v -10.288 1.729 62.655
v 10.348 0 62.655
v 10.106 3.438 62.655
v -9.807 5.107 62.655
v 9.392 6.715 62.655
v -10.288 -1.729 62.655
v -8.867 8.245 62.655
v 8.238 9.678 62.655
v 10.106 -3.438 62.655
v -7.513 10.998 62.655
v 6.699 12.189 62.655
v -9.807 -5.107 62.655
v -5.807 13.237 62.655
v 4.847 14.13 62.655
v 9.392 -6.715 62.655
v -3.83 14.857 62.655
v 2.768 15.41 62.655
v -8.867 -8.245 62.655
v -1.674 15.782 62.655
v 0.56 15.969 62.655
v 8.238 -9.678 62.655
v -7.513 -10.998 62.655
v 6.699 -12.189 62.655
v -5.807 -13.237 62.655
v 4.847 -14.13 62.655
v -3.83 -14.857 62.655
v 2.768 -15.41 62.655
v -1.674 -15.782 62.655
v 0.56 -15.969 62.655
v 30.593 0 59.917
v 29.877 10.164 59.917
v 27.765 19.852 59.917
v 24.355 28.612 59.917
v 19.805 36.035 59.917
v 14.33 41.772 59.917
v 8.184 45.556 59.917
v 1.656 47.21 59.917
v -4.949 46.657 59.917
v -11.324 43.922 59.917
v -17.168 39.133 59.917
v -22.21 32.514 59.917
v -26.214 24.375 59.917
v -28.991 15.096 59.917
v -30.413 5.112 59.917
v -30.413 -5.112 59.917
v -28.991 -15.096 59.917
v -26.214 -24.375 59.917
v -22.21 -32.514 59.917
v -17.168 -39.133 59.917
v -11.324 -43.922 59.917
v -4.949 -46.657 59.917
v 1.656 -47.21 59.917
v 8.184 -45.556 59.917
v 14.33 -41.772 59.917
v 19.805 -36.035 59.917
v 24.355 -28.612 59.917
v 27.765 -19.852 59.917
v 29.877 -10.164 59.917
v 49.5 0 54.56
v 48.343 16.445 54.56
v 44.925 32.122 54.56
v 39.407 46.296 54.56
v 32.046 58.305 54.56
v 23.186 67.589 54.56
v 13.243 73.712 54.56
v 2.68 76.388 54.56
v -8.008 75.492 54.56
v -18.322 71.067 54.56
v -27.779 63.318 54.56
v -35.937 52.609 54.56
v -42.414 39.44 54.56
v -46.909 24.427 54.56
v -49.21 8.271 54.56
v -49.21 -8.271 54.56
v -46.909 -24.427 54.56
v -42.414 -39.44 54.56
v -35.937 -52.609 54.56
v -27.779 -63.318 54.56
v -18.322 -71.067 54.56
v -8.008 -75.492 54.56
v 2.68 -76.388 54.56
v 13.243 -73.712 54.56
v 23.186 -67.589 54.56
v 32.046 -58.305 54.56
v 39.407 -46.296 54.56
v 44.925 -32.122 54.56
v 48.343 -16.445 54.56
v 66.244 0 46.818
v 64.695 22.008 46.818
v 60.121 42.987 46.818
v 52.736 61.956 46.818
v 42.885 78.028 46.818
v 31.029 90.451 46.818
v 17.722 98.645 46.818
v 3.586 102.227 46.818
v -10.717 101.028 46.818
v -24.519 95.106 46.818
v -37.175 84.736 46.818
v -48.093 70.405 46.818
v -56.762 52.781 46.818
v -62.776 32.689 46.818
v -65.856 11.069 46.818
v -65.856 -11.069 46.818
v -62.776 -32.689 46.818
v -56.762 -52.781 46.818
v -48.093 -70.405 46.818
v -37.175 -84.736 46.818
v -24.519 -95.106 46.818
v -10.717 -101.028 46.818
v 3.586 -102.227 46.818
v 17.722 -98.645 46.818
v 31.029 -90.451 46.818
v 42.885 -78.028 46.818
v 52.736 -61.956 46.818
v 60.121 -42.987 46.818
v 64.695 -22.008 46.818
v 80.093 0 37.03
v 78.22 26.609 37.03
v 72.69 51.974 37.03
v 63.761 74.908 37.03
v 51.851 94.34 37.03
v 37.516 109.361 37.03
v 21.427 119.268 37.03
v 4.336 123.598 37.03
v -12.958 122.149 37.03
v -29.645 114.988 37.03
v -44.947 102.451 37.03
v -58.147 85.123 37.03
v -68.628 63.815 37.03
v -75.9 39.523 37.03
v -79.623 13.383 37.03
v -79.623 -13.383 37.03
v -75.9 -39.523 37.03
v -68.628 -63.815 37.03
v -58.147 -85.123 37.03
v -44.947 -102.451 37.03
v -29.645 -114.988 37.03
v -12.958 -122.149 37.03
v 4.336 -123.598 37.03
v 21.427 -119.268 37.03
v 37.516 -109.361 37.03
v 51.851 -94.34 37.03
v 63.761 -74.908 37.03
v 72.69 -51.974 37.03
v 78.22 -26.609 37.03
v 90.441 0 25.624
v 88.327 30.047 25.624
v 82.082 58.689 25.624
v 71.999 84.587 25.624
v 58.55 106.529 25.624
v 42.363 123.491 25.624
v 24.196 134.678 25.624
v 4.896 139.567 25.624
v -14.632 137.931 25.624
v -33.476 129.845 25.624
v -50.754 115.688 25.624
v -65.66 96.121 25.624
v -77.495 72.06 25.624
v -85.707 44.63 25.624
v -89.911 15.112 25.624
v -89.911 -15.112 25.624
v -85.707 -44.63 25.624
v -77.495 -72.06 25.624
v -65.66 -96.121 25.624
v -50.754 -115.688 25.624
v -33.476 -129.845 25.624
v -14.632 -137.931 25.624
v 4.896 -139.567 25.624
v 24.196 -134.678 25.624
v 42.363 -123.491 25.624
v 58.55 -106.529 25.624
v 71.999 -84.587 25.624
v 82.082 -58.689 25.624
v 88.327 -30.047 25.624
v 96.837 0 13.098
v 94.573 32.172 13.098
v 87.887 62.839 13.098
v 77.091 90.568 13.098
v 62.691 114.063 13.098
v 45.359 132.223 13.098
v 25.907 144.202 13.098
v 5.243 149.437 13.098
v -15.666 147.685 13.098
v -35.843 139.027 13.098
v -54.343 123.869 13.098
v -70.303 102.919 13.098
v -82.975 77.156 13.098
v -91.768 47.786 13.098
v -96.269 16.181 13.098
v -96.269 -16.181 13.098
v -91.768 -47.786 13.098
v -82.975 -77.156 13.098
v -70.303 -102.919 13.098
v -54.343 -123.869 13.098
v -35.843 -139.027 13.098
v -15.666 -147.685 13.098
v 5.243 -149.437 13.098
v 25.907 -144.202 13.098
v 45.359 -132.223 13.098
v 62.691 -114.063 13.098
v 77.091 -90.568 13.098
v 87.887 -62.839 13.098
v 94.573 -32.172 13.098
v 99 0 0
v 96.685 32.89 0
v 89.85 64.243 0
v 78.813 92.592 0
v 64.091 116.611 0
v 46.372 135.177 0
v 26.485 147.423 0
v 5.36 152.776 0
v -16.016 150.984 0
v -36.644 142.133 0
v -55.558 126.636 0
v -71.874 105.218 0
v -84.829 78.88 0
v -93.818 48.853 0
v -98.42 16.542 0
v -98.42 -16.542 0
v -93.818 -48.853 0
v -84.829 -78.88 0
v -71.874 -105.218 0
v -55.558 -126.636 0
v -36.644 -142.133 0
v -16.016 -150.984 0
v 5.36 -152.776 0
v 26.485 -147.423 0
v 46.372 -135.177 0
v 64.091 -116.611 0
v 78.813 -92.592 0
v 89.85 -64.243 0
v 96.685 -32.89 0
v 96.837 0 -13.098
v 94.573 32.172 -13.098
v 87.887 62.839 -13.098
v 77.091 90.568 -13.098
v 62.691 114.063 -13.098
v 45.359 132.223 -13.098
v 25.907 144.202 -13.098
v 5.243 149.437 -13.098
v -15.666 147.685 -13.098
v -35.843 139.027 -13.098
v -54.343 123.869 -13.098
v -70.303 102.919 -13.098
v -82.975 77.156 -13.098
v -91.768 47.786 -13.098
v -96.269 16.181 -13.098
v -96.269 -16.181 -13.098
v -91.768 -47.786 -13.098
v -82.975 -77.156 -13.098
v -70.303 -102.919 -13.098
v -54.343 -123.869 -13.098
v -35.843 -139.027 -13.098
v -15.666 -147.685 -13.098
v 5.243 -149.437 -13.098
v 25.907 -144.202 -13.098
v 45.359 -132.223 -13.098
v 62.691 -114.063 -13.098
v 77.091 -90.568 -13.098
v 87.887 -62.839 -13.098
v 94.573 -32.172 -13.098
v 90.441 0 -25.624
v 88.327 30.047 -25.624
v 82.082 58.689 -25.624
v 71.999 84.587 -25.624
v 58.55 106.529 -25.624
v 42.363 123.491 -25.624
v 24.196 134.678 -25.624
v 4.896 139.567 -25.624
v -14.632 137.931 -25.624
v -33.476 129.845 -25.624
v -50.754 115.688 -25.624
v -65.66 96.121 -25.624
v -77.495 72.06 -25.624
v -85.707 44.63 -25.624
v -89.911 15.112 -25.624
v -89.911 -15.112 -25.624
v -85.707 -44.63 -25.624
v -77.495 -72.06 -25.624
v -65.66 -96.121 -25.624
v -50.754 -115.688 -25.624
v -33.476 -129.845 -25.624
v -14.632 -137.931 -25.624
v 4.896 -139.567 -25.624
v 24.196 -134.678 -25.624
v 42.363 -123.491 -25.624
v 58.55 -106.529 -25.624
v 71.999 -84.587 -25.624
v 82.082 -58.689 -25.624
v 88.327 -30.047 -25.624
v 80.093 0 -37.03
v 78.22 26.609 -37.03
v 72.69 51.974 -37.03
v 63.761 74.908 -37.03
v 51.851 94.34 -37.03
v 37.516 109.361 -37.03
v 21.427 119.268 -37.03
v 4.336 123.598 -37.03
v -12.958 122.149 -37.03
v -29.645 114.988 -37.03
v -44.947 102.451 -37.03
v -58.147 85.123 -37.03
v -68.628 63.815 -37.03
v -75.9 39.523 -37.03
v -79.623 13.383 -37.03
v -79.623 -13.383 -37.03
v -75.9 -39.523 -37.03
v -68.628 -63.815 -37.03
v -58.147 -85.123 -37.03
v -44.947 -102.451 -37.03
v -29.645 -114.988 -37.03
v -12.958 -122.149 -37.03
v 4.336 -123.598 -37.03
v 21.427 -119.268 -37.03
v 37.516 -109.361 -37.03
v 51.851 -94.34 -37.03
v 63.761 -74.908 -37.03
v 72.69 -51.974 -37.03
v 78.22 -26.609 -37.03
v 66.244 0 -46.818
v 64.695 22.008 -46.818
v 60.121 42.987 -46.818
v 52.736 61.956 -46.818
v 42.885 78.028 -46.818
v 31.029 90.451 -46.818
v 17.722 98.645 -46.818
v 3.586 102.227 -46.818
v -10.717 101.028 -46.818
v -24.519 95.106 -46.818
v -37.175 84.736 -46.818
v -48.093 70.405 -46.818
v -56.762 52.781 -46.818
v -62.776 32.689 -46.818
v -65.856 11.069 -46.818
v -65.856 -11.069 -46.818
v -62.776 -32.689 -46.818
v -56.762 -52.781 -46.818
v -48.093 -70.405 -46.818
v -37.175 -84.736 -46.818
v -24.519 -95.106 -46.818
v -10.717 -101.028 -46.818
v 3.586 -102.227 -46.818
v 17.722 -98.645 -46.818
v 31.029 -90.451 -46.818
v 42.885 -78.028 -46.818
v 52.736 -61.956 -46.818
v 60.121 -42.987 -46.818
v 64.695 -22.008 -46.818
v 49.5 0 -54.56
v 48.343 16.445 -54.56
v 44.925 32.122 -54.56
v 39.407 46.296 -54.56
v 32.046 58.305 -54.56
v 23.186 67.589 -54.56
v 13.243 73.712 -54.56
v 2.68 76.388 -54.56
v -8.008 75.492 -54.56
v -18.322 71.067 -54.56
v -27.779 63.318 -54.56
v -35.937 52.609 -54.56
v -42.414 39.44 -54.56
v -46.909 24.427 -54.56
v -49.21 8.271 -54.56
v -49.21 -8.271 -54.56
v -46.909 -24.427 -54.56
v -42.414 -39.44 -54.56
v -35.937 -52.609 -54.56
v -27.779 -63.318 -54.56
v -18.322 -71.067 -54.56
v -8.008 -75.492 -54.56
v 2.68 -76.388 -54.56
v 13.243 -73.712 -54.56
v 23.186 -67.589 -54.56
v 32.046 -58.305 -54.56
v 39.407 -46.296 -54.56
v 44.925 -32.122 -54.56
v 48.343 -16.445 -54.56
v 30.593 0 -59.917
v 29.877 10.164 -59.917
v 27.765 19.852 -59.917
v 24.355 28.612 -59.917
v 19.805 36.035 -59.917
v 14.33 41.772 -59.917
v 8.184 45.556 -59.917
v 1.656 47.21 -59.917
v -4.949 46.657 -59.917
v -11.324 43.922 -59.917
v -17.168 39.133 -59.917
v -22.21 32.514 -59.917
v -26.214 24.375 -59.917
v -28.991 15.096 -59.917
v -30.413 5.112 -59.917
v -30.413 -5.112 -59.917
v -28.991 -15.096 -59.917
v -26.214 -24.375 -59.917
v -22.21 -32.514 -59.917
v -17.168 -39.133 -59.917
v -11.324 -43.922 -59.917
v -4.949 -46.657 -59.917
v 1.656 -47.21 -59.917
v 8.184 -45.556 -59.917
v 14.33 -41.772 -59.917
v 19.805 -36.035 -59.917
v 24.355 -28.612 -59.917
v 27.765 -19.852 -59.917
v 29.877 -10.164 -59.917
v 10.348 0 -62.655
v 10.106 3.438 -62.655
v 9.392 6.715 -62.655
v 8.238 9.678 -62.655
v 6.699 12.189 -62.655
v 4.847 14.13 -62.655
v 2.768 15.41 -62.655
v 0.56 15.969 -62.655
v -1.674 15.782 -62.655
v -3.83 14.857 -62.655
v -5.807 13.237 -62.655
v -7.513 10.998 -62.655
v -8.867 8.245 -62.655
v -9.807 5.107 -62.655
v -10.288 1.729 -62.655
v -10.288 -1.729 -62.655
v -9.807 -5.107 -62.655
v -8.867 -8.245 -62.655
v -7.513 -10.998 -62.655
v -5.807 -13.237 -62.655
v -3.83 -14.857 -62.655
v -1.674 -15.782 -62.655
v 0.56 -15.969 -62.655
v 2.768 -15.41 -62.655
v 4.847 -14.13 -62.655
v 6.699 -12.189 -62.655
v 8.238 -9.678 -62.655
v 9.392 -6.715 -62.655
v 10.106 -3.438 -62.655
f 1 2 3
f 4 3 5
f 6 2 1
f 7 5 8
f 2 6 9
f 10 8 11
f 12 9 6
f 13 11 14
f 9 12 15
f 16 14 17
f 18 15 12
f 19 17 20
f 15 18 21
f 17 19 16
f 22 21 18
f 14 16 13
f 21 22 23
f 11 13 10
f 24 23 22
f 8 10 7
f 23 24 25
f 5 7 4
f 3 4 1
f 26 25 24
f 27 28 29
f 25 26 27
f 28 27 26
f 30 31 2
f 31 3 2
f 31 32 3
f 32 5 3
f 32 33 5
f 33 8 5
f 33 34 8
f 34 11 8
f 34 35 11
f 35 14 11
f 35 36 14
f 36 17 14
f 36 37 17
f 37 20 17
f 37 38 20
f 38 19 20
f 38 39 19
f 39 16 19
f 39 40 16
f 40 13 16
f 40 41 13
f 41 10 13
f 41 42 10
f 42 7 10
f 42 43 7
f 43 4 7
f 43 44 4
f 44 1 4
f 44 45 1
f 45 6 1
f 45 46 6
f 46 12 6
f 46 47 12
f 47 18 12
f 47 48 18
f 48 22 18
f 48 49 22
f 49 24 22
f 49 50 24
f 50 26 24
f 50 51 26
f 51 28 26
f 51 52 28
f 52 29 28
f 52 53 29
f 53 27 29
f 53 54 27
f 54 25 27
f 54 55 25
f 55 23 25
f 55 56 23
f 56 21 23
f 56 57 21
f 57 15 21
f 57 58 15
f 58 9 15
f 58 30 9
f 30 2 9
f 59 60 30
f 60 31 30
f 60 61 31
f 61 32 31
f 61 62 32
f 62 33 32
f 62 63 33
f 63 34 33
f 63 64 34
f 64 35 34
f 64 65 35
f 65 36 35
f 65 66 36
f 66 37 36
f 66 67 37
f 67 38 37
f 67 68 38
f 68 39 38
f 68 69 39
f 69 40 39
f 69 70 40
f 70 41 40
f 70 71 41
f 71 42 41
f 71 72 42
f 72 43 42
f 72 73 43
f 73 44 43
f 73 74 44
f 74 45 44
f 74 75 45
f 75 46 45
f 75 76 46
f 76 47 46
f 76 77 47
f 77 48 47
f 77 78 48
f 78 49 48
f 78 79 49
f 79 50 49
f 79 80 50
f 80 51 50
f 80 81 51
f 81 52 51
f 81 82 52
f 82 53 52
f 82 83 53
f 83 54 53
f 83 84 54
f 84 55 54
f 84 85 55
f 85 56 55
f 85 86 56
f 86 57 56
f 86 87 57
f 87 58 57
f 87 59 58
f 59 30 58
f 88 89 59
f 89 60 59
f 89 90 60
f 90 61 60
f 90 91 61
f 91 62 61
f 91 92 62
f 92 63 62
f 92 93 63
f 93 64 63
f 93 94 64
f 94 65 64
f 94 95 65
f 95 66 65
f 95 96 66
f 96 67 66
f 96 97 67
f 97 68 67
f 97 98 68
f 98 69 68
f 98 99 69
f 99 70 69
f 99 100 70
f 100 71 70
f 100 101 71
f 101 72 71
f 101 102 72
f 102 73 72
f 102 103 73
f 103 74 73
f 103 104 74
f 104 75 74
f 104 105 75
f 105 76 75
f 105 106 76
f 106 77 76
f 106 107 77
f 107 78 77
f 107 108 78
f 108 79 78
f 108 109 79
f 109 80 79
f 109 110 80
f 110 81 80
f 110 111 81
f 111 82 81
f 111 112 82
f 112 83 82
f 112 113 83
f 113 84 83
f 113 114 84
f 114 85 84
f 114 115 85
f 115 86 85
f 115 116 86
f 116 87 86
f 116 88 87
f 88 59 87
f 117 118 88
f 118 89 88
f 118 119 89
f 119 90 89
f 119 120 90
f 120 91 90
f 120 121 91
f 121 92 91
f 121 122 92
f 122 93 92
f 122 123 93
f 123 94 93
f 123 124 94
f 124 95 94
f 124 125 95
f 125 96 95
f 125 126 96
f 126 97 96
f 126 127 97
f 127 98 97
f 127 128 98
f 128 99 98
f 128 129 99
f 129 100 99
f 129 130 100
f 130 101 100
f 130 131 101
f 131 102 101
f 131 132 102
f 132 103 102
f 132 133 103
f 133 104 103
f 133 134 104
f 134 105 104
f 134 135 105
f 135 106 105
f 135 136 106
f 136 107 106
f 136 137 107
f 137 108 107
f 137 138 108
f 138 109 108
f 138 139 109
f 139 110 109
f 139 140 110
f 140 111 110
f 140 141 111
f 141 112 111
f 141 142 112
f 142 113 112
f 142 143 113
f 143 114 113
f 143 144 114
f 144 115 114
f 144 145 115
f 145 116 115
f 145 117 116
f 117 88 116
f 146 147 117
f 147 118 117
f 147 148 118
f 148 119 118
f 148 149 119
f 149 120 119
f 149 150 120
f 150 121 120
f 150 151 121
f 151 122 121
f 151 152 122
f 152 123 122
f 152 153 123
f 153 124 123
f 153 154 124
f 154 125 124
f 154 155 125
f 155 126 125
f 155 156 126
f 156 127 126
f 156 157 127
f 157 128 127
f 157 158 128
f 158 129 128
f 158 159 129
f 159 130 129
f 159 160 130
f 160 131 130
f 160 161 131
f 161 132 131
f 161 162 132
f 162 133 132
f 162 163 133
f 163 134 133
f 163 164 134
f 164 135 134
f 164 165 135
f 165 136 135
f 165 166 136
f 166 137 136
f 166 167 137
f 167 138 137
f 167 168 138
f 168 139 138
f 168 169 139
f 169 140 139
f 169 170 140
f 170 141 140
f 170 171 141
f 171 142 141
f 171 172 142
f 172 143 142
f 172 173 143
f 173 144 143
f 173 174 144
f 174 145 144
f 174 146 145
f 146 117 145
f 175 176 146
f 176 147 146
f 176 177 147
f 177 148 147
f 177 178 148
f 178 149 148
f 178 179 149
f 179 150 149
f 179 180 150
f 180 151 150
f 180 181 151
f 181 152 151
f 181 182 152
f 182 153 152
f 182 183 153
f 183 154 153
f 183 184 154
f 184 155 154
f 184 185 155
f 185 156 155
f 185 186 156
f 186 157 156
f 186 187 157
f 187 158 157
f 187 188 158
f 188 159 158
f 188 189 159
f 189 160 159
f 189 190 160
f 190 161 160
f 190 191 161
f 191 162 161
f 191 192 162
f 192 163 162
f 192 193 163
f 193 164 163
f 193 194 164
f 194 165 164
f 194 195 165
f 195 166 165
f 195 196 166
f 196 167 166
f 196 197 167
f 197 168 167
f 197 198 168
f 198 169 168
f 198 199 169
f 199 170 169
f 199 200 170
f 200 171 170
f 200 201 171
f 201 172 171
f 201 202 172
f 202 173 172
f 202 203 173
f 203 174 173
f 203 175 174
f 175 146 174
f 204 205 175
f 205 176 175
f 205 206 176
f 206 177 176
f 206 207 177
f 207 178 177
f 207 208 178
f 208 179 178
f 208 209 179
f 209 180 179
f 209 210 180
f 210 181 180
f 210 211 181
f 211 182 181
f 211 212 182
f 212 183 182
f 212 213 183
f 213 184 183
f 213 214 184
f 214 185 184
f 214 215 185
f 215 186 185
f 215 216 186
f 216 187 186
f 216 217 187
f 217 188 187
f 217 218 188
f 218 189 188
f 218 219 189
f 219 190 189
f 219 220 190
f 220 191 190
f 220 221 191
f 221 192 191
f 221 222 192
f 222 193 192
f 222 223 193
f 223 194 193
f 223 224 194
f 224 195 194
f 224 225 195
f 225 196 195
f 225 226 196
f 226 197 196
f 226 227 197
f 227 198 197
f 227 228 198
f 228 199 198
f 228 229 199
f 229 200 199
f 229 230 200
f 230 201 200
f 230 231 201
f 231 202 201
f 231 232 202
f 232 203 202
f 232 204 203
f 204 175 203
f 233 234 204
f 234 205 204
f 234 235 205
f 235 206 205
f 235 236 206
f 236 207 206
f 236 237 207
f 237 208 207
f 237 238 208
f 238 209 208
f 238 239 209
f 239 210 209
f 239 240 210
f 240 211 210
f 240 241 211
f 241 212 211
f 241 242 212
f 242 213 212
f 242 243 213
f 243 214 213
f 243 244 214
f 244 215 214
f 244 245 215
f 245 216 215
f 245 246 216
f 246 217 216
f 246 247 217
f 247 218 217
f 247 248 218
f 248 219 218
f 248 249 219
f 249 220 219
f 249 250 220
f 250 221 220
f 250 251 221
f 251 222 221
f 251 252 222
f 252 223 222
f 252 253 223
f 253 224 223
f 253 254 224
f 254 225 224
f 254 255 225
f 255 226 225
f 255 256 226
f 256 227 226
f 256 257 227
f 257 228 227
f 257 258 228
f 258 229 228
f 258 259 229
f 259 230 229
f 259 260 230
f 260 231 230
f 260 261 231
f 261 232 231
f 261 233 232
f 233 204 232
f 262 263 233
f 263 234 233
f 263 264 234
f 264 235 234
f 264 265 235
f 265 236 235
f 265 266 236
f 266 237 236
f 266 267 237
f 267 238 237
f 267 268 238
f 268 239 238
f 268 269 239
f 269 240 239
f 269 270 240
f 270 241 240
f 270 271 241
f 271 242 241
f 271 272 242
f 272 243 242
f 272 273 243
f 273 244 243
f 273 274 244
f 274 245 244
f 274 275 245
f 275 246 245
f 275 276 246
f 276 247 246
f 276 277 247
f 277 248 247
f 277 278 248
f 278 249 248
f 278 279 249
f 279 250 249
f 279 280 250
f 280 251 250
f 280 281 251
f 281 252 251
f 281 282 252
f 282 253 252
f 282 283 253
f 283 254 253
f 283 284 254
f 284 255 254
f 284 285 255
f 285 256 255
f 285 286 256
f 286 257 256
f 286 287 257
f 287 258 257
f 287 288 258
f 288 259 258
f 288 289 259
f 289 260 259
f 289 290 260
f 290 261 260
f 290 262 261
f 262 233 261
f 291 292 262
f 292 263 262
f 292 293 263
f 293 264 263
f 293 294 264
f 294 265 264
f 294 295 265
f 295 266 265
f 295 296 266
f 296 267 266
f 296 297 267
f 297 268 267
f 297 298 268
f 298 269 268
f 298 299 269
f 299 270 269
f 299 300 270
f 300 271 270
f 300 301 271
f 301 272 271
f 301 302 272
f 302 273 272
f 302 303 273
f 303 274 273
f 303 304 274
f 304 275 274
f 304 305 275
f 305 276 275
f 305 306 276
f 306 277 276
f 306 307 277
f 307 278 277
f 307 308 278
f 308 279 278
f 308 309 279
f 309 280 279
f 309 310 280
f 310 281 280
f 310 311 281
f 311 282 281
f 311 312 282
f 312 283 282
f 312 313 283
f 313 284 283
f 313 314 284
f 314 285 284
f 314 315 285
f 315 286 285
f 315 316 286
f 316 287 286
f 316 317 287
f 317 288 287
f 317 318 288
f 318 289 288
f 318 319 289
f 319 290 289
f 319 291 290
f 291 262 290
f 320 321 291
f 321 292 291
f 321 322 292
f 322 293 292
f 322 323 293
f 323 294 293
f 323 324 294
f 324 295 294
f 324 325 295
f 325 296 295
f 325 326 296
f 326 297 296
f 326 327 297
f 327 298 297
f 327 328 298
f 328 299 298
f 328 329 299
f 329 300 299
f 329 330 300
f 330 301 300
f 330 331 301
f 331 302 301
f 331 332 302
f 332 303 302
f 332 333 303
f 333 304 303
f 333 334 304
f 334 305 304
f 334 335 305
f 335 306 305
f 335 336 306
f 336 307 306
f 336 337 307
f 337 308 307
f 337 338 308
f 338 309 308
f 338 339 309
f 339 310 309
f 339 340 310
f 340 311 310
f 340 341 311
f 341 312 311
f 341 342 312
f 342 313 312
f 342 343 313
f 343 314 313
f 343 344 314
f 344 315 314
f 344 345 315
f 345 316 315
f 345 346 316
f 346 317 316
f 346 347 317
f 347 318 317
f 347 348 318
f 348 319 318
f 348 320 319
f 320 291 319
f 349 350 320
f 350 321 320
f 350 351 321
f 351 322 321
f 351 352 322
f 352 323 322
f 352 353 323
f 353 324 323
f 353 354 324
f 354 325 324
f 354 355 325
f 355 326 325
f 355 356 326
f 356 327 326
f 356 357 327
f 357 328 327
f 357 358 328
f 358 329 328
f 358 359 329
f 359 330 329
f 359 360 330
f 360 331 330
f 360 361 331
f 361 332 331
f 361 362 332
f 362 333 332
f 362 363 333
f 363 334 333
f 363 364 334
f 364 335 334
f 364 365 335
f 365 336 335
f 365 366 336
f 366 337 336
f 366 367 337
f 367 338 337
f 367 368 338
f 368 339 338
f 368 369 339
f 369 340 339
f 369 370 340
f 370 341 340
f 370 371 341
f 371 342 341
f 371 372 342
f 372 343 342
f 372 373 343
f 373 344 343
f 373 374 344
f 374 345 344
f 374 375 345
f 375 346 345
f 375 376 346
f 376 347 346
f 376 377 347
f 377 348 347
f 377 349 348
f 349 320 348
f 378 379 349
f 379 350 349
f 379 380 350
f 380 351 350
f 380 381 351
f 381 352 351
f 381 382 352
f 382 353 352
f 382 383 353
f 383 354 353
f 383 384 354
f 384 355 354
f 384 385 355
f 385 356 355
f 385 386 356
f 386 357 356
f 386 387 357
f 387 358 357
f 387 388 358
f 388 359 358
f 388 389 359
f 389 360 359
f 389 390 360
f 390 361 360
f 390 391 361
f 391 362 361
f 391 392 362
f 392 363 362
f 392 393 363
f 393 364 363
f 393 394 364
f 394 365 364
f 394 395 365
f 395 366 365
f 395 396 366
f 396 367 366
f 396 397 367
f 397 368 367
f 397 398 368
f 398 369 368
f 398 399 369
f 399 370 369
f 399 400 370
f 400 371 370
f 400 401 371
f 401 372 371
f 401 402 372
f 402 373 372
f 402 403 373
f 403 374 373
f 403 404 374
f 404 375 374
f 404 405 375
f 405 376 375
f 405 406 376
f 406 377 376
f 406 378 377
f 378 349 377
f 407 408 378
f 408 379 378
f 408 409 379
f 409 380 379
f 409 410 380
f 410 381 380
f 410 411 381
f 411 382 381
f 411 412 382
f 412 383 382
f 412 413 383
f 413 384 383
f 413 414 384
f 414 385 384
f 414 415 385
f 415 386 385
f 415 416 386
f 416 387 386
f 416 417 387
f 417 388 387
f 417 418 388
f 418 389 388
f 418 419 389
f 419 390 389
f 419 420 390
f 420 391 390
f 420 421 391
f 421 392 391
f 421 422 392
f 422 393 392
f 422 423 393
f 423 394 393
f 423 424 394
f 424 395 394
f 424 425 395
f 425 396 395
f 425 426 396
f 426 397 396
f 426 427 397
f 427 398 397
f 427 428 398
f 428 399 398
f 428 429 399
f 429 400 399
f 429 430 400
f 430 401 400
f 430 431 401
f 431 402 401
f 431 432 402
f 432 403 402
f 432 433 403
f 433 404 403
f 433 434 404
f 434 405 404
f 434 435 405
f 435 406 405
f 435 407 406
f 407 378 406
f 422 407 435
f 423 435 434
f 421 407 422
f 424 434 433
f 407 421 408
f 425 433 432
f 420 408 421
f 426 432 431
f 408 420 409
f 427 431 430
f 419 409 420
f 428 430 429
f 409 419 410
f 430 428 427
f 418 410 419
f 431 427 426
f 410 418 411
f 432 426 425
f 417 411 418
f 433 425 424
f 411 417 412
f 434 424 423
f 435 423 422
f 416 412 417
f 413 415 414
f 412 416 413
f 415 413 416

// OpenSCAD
// Generated by SolidPython 1.0.1 on 2020-07-29 00:46:50


scale(v = [11, 17, 7]) {
	sphere(r = 9);
}
/***********************************************
*********      SolidPython code:      **********
************************************************
 
# import packages: SolidPython
from solid import *
from solid.utils import *
from itertools import chain, combinations, permutations


class Resize:

    def __init__(self, scad_file):
        self.scad_file = scad_file
        #self.scad_file = import_scad(scad_file)
        # cone/cylinder param:
        self.r1 = 0
        self.r2 = 0
        self.h = 0
        # rectangular prism param:
        self.w = 0
        self.l = 0
        # ellipse param:
        self.r = 0

    # import OpenScad code (file name corresponds to shape)


    # classify shape + parameters
    def assign(self, param1, param2, param3):
        if self.scad_file == 'cone.scad':
            self.r1 = param1
            self.r2 = param2
            self.h = param3
        elif self.scad_file == 'cylinder.scad':
            self.r1 = param1
            self.r2 = param2
            self.h = param3
        elif self.scad_file == 'rectangularPrism.scad':
            self.h = param1
            self.l = param2
            self.w = param3
        else:
            self.r = param1
            self.h = param2

    # resize parameters
    def iterate(self):
        x = range(3, 20, 2)
        i = 1
        if self.scad_file == 'cone.scad':
            tempList = list(permutations(x, 2))
            for temp in tempList:
                param1 = temp[0]
                param2 = temp[1]
                filepath = 'produced_scad_files/' + 'cone' + str(param1) + '_' + str(param2) + '_' + '.scad'
                scad_render_to_file(cylinder(h=param1, r1=param2, r2=0), filepath)

        elif self.scad_file == 'cylinder.scad':
            tempList = list(permutations(x, 3))
            for temp in tempList:
                param1 = temp[0]
                param2 = temp[1]
                filepath = 'produced_scad_files/' + 'cylinder' + str(param1) + '_' + str(param2) + '_' + '.scad'
                scad_render_to_file(cylinder(h=param1, r1=param2, r2=param2), filepath)

        elif self.scad_file == 'rectangularPrism.scad':
            tempList = list(permutations(x, 3))
            for temp in tempList:
                param1 = temp[0]
                param2 = temp[1]
                param3 = temp[2]
                filepath = 'produced_scad_files/' + 'rectangularPrism' + str(param1) + '_' + str(param2) + '_' + str(
                    param3) + '.scad'
                scad_render_to_file(cube(size=(param1, param2, param3)), filepath)

        elif self.scad_file == 'ellipse.scad':
            tempList = list(permutations(x, 4))
            for temp in tempList:
                param1 = temp[0]
                param2 = temp[1]
                param3 = temp[2]
                param4 = temp[3]
                filepath = 'produced_scad_files/' + 'ellipse' + str(param1) + '_' + str(param2) + '_' + str(param3) + '_' + str(param4) + '.scad'
                scad_render_to_file(scale([param1, param2, param3])(sphere(r=param4)), filepath)

    def render_to_scadfile(self):
        scad_render_to_file(scad, 'example.scad') 
 
************************************************/
